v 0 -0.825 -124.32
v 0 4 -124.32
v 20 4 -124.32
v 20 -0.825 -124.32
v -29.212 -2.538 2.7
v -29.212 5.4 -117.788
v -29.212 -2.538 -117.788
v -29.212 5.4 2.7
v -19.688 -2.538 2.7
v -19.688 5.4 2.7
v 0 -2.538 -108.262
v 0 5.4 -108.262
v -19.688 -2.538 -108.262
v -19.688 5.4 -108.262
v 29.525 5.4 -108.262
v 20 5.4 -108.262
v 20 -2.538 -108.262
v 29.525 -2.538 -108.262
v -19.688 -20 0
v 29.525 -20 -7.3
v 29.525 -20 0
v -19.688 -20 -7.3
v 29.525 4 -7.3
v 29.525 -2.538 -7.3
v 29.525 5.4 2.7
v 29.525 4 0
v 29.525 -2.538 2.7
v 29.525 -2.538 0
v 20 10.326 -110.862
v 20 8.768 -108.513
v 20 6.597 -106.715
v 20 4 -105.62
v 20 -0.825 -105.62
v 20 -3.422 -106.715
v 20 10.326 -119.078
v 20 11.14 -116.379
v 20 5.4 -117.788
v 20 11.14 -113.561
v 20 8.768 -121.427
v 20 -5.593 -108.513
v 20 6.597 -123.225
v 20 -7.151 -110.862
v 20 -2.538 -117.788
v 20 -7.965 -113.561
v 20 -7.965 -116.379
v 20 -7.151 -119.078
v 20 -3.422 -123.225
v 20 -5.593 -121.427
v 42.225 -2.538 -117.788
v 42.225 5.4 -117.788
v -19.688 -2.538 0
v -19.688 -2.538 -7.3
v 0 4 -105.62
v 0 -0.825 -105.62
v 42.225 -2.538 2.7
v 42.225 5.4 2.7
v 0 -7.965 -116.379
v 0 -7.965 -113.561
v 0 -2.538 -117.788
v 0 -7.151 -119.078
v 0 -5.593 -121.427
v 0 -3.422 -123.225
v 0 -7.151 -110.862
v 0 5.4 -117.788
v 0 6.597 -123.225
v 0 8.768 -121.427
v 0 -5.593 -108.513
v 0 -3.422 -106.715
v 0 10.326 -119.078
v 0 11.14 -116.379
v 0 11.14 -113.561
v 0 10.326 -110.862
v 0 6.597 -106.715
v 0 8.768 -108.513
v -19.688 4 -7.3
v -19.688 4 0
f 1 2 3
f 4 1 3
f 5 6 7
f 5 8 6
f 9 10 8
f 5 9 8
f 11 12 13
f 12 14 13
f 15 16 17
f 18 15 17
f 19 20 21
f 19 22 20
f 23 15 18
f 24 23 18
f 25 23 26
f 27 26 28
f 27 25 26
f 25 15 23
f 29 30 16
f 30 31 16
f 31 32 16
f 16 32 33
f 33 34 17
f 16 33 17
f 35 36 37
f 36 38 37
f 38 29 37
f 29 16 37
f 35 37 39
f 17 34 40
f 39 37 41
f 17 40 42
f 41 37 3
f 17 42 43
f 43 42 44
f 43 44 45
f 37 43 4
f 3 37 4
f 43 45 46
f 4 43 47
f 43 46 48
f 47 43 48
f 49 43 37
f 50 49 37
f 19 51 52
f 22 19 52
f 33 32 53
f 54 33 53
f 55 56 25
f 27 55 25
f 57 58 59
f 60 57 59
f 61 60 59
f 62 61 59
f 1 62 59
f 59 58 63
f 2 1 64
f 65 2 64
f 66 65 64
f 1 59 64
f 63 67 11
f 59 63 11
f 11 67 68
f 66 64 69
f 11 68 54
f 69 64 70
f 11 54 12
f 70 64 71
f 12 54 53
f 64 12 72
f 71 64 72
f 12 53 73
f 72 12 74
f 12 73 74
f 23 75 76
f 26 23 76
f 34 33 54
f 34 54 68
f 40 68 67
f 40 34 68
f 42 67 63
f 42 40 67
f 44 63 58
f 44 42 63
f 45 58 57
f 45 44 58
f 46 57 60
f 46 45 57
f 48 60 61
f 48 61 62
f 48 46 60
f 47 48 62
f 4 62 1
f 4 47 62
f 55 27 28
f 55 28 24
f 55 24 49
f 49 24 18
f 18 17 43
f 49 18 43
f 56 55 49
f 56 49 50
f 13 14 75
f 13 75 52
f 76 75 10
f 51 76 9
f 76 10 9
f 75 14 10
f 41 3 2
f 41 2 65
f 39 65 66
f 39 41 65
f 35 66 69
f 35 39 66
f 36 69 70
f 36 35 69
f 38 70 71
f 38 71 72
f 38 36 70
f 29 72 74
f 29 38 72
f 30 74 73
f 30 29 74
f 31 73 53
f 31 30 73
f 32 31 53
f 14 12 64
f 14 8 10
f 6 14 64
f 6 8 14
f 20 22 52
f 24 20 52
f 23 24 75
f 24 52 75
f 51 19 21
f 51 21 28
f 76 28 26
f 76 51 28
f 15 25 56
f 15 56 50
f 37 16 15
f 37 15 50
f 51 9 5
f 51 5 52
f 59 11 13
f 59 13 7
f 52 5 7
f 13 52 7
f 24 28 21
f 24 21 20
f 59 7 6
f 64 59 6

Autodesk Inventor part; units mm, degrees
ref_plane "YZ Plane" through (0, 0, 0) normal (1, 0, 0) x (0, 1, 0)
ref_plane "XZ Plane" through (0, 0, 0) normal (0, 1, 0) x (-1, 0, 0)
ref_plane "XY Plane" through (0, 0, 0) normal (0, 0, 1) x (1, 0, 0)
sketch "Эскиз1" plane through (0, 0, 0) normal (1, 0, 0) x (0, 1, 0)
  line L0 (0, 0) -> (4, 0)
  line L1 (4, 0) -> (4, -125)
  line L2 (4, -125) -> (0, -125)
  line L3 (0, -125) -> (0, 0)
  dimension "d0" = 4
  dimension "d1" = 125
extrude "Выдавливание1" add sketch "Эскиз1" along normal blind 20
sketch "Эскиз2" plane through (0, 0, 0) normal (0, 0, 1) x (1, 0, 0)
  line L0 (0, 0) -> (0, 4) projected
  line L1 (0, 4) -> (-20.6542, 14.0196)
  line L2 (-20.6542, 14.0196) -> (-22.225, 10.7816)
  line L3 (-22.225, 10.7816) -> (0, 0)
  line L4 (0, 4) -> (20, 4) projected
  line L5 (0, 0) -> (20, 0) projected
  line L6 (10, 4) -> (10, 0)
  line L7 (20, 4) -> (40.6542, 14.0196)
  line L8 (40.6542, 14.0196) -> (42.225, 10.7816)
  line L9 (42.225, 10.7816) -> (20, 0)
extrude "Выдавливание2" add sketch "Эскиз2" against normal blind 20 contours L3 L2 L1 L0 | L6 L4 L7 L8 L9 L5
sketch "Эскиз3" plane through (20, 0, 0) normal (1, 0, 0) x (0, 0, -1)
  circle A0 centre (114.9699, 1.5875) radius 9.6564
  line L0 (125, 0) -> (125, 4) projected
  point P0 (0, 0)
  dimension "d16" = 10.0301
extrude "Выдавливание3" add sketch "Эскиз3" against normal blind 20
sketch "Эскиз4" plane through (0, 0, -20) normal (0, 0, -1) x (-1, 0, 0)
  line L0 (-20, 4) -> (-20, 0) projected
  line L1 (-20, 4) -> (-40.6542, 14.0196) projected
  line L2 (-40.6542, 14.0196) -> (-42.225, 10.7816) projected
  line L3 (-42.225, 10.7816) -> (-20, 0) projected
  line L4 (-40.6542, 14.0196) -> (-37.955, 12.7102)
  line L5 (-37.955, 12.7102) -> (-39.5258, 9.4722)
  line L6 (-42.225, 10.7816) -> (-39.5258, 9.4722)
  line L7 (-42.225, 10.7816) -> (-40.6542, 14.0196)
  line L8 (20.6542, 14.0196) -> (0, 4) projected
  line L9 (0, 0) -> (0, 4) projected
  line L10 (0, 0) -> (22.225, 10.7816) projected
  line L11 (22.225, 10.7816) -> (20.6542, 14.0196) projected
  line L12 (20.6542, 14.0196) -> (17.955, 12.7102)
  line L13 (17.955, 12.7102) -> (19.5258, 9.4722)
  line L14 (19.5258, 9.4722) -> (22.225, 10.7816)
  line L15 (20.6542, 14.0196) -> (22.225, 10.7816)
  dimension "d8" = 3
  dimension "d9" = 3
extrude "Выдавливание4" add sketch "Эскиз4" along normal up to surface (105 mm away) contours L5 L3 L2 L1 | L11 L10 L13 L8
sketch "Эскиз5" plane through (39.5258, 9.4722, -125) normal (0, 0, -1) x (-0.8997207, -0.436466, 0)
  line L0 (0, 3.5989) -> (0, 0) projected
  line L1 (0, 0) -> (21.7021, 0) projected
  line L2 (19.9562, 3.5989) -> (21.7021, 0) projected
  line L3 (19.9562, 3.5989) -> (0, 3.5989) projected
  line L4 (53.13, 25.7741) -> (50.3035, 28.0017) projected
  line L5 (50.3035, 28.0017) -> (37.9507, 12.3282) projected
  line L6 (39.6965, 8.7293) -> (37.9507, 12.3282) projected
  line L7 (39.6965, 8.7293) -> (53.13, 25.7741) projected
  line L8 (53.13, 25.7741) -> (50.3035, 28.0017) projected
  line L9 (54.987, 28.1302) -> (53.13, 25.7741) projected
  line L10 (52.1605, 30.3579) -> (54.987, 28.1302) projected
  line L11 (50.3035, 28.0017) -> (52.1605, 30.3579) projected
  line L12 (0, 3.5989) -> (0, 0) projected
  line L13 (-3, 3.5989) -> (0, 3.5989) projected
  line L14 (-3, 0) -> (-3, 3.5989) projected
  line L15 (0, 0) -> (-3, 0) projected
extrude "Выдавливание5" add sketch "Эскиз5" against normal blind 20 contours L3 L2 L1 L0 | L7 L6 L5 L4
sketch "Эскиз6" plane through (0, 4, 0) normal (0, 1, 0) x (1, 0, 0)
  line L0 (0, 105.6197) -> (0, 105) projected
  line L1 (0, 105) -> (0, 20) projected
  line L2 (0, 20) -> (0, 0) projected
  line L3 (0, 0) -> (20, 0) projected
  line L4 (20, 20) -> (20, 0) projected
  line L5 (20, 105) -> (20, 20) projected
  line L6 (20, 105.6197) -> (20, 105) projected
  line L7 (-19.5258, 105) -> (0, 105) projected
  line L8 (0, 105) -> (20, 105)
  line L9 (0, 20) -> (20, 20)
  line L10 (0, 125) -> (20, 125) projected
  line L11 (0, 124.3201) -> (20, 124.3201) projected
  line L12 (20, 125) -> (20, 124.3201) projected
  line L13 (0, 125) -> (0, 124.3201) projected
  line L14 (20, 105.6197) -> (0, 105.6197) projected
  point P0 (0, 0)
extrude "Выдавливание6" cut sketch "Эскиз6" against normal blind 20 contours L14 L6 L8 L0 | L8 L5 L9 L1 | L10 L12 L11 L13
sketch "Эскиз7" plane through (0, 0, -20) normal (0, -1, 0) x (1, 0, 0)
  line L0 (0, 0) -> (0, 20) projected
  line L1 (20, 0) -> (20, 20) projected
  line L2 (0, 20) -> (20, 20)
  line L3 (20, 20) -> (20, 12.7)
  line L4 (20, 12.7) -> (0, 12.7)
  line L5 (0, 12.7) -> (0, 20)
extrude "Выдавливание7" add sketch "Эскиз7" along normal blind 20
sketch "Эскиз8" plane through (0, 0, -105) normal (0, -1, 0) x (1, 0, 0)
  line L0 (20, 97.7) -> (0, 97.7) projected
  line L1 (0, 97.7) -> (0, 85) projected
  line L2 (0, 85) -> (0, 0) projected
  line L3 (0, 0) -> (20, 0) projected
  line L4 (20, 85) -> (20, 0) projected
  line L5 (20, 97.7) -> (20, 85) projected
  line L6 (39.5258, 85) -> (20, 85) projected
  line L7 (0, 85) -> (-19.5258, 85) projected
  line L8 (20, 105) -> (42.225, 105) projected
  line L9 (20, 105) -> (20, 97.7) projected
  line L10 (20, 97.7) -> (20, 85) projected
  line L11 (39.5258, 85) -> (20, 85) projected
  line L12 (39.5258, 85) -> (39.5258, 0) projected
  line L13 (20, 0) -> (39.5258, 0) projected
  line L14 (20, -0.6197) -> (20, 0) projected
  line L15 (20, -19.3201) -> (20, -0.6197) projected
  line L16 (20, -19.3201) -> (20, -20) projected
  line L17 (42.225, -20) -> (20, -20) projected
  line L18 (42.225, 105) -> (42.225, -20) projected
  line L19 (-22.225, 105) -> (0, 105) projected
  line L20 (-22.225, 105) -> (-22.225, -20) projected
  line L21 (-22.225, -20) -> (0, -20) projected
  line L22 (0, -19.3201) -> (0, -20) projected
  line L23 (0, -0.6197) -> (0, -19.3201) projected
  line L24 (0, 0) -> (0, -0.6197) projected
  line L25 (-19.5258, 0) -> (0, 0) projected
  line L26 (-19.5258, 85) -> (-19.5258, 0) projected
  line L27 (0, 85) -> (-19.5258, 85) projected
  line L28 (0, 97.7) -> (0, 85) projected
  line L29 (0, 105) -> (0, 97.7) projected
  line L30 (20, 85) -> (0, 85)
  point P0 (0, 97.7)
extrude "Выдавливание8" cut sketch "Эскиз8" against normal blind 20
sketch "Эскиз9" plane through (20, -20, -7.3) normal (0, 0, -1) x (-1, 0, 0)
  line L0 (-22.225, 25.4) -> (49.2125, 25.4)
  line L1 (49.2125, 25.4) -> (49.2125, 17.4625)
  line L2 (49.2125, 17.4625) -> (-22.225, 17.4625)
  line L3 (-22.225, 17.4625) -> (-22.225, 25.4)
  line L4 (-22.225, 25.4) -> (-9.525, 25.4)
  line L5 (-9.525, 25.4) -> (-9.525, 17.4625)
  line L6 (-9.525, 17.4625) -> (-22.225, 17.4625)
  line L7 (-22.225, 17.4625) -> (-22.225, 25.4)
  line L8 (49.2125, 25.4) -> (39.6875, 25.4)
  line L9 (39.6875, 25.4) -> (39.6875, 17.4625)
  line L10 (39.6875, 17.4625) -> (49.2125, 17.4625)
  line L11 (49.2125, 17.4625) -> (49.2125, 25.4)
  point P0 (20, 20)
extrude "Выдавливание9" add sketch "Эскиз9" along normal blind 110.4875 and the other way blind 10 contours L0 L5 L2 L3 | L0 L1 L2 L9
sketch "Эскиз10" plane through (-19.6875, -2.5375, -117.7875) normal (1, 0, 0) x (0, 0, -1)
  line L0 (-117.7875, -17.4625) -> (-117.7875, 6.5375) projected
  line L1 (-110.4875, -17.4625) -> (-117.7875, -17.4625) projected
  line L2 (-110.4875, -17.4625) -> (-110.4875, 6.5375) projected
  line L3 (-110.4875, 6.5375) -> (-117.7875, 6.5375) projected
  line L4 (-120.4875, 7.9375) -> (0, 7.9375) projected
  line L5 (-120.4875, 0) -> (0, 0) projected
  line L6 (0, 7.9375) -> (-9.525, 7.9375)
  line L7 (-9.525, 7.9375) -> (-9.525, 0)
  line L8 (-9.525, 0) -> (0, 0)
  line L9 (0, 0) -> (0, 7.9375)
  point P0 (-117.7875, 2.5375)
extrude "Выдавливание10" add sketch "Эскиз10" along normal up to surface (49.2125 mm away)
properties part number "ПАЛЬЧИК ножки врозь"
